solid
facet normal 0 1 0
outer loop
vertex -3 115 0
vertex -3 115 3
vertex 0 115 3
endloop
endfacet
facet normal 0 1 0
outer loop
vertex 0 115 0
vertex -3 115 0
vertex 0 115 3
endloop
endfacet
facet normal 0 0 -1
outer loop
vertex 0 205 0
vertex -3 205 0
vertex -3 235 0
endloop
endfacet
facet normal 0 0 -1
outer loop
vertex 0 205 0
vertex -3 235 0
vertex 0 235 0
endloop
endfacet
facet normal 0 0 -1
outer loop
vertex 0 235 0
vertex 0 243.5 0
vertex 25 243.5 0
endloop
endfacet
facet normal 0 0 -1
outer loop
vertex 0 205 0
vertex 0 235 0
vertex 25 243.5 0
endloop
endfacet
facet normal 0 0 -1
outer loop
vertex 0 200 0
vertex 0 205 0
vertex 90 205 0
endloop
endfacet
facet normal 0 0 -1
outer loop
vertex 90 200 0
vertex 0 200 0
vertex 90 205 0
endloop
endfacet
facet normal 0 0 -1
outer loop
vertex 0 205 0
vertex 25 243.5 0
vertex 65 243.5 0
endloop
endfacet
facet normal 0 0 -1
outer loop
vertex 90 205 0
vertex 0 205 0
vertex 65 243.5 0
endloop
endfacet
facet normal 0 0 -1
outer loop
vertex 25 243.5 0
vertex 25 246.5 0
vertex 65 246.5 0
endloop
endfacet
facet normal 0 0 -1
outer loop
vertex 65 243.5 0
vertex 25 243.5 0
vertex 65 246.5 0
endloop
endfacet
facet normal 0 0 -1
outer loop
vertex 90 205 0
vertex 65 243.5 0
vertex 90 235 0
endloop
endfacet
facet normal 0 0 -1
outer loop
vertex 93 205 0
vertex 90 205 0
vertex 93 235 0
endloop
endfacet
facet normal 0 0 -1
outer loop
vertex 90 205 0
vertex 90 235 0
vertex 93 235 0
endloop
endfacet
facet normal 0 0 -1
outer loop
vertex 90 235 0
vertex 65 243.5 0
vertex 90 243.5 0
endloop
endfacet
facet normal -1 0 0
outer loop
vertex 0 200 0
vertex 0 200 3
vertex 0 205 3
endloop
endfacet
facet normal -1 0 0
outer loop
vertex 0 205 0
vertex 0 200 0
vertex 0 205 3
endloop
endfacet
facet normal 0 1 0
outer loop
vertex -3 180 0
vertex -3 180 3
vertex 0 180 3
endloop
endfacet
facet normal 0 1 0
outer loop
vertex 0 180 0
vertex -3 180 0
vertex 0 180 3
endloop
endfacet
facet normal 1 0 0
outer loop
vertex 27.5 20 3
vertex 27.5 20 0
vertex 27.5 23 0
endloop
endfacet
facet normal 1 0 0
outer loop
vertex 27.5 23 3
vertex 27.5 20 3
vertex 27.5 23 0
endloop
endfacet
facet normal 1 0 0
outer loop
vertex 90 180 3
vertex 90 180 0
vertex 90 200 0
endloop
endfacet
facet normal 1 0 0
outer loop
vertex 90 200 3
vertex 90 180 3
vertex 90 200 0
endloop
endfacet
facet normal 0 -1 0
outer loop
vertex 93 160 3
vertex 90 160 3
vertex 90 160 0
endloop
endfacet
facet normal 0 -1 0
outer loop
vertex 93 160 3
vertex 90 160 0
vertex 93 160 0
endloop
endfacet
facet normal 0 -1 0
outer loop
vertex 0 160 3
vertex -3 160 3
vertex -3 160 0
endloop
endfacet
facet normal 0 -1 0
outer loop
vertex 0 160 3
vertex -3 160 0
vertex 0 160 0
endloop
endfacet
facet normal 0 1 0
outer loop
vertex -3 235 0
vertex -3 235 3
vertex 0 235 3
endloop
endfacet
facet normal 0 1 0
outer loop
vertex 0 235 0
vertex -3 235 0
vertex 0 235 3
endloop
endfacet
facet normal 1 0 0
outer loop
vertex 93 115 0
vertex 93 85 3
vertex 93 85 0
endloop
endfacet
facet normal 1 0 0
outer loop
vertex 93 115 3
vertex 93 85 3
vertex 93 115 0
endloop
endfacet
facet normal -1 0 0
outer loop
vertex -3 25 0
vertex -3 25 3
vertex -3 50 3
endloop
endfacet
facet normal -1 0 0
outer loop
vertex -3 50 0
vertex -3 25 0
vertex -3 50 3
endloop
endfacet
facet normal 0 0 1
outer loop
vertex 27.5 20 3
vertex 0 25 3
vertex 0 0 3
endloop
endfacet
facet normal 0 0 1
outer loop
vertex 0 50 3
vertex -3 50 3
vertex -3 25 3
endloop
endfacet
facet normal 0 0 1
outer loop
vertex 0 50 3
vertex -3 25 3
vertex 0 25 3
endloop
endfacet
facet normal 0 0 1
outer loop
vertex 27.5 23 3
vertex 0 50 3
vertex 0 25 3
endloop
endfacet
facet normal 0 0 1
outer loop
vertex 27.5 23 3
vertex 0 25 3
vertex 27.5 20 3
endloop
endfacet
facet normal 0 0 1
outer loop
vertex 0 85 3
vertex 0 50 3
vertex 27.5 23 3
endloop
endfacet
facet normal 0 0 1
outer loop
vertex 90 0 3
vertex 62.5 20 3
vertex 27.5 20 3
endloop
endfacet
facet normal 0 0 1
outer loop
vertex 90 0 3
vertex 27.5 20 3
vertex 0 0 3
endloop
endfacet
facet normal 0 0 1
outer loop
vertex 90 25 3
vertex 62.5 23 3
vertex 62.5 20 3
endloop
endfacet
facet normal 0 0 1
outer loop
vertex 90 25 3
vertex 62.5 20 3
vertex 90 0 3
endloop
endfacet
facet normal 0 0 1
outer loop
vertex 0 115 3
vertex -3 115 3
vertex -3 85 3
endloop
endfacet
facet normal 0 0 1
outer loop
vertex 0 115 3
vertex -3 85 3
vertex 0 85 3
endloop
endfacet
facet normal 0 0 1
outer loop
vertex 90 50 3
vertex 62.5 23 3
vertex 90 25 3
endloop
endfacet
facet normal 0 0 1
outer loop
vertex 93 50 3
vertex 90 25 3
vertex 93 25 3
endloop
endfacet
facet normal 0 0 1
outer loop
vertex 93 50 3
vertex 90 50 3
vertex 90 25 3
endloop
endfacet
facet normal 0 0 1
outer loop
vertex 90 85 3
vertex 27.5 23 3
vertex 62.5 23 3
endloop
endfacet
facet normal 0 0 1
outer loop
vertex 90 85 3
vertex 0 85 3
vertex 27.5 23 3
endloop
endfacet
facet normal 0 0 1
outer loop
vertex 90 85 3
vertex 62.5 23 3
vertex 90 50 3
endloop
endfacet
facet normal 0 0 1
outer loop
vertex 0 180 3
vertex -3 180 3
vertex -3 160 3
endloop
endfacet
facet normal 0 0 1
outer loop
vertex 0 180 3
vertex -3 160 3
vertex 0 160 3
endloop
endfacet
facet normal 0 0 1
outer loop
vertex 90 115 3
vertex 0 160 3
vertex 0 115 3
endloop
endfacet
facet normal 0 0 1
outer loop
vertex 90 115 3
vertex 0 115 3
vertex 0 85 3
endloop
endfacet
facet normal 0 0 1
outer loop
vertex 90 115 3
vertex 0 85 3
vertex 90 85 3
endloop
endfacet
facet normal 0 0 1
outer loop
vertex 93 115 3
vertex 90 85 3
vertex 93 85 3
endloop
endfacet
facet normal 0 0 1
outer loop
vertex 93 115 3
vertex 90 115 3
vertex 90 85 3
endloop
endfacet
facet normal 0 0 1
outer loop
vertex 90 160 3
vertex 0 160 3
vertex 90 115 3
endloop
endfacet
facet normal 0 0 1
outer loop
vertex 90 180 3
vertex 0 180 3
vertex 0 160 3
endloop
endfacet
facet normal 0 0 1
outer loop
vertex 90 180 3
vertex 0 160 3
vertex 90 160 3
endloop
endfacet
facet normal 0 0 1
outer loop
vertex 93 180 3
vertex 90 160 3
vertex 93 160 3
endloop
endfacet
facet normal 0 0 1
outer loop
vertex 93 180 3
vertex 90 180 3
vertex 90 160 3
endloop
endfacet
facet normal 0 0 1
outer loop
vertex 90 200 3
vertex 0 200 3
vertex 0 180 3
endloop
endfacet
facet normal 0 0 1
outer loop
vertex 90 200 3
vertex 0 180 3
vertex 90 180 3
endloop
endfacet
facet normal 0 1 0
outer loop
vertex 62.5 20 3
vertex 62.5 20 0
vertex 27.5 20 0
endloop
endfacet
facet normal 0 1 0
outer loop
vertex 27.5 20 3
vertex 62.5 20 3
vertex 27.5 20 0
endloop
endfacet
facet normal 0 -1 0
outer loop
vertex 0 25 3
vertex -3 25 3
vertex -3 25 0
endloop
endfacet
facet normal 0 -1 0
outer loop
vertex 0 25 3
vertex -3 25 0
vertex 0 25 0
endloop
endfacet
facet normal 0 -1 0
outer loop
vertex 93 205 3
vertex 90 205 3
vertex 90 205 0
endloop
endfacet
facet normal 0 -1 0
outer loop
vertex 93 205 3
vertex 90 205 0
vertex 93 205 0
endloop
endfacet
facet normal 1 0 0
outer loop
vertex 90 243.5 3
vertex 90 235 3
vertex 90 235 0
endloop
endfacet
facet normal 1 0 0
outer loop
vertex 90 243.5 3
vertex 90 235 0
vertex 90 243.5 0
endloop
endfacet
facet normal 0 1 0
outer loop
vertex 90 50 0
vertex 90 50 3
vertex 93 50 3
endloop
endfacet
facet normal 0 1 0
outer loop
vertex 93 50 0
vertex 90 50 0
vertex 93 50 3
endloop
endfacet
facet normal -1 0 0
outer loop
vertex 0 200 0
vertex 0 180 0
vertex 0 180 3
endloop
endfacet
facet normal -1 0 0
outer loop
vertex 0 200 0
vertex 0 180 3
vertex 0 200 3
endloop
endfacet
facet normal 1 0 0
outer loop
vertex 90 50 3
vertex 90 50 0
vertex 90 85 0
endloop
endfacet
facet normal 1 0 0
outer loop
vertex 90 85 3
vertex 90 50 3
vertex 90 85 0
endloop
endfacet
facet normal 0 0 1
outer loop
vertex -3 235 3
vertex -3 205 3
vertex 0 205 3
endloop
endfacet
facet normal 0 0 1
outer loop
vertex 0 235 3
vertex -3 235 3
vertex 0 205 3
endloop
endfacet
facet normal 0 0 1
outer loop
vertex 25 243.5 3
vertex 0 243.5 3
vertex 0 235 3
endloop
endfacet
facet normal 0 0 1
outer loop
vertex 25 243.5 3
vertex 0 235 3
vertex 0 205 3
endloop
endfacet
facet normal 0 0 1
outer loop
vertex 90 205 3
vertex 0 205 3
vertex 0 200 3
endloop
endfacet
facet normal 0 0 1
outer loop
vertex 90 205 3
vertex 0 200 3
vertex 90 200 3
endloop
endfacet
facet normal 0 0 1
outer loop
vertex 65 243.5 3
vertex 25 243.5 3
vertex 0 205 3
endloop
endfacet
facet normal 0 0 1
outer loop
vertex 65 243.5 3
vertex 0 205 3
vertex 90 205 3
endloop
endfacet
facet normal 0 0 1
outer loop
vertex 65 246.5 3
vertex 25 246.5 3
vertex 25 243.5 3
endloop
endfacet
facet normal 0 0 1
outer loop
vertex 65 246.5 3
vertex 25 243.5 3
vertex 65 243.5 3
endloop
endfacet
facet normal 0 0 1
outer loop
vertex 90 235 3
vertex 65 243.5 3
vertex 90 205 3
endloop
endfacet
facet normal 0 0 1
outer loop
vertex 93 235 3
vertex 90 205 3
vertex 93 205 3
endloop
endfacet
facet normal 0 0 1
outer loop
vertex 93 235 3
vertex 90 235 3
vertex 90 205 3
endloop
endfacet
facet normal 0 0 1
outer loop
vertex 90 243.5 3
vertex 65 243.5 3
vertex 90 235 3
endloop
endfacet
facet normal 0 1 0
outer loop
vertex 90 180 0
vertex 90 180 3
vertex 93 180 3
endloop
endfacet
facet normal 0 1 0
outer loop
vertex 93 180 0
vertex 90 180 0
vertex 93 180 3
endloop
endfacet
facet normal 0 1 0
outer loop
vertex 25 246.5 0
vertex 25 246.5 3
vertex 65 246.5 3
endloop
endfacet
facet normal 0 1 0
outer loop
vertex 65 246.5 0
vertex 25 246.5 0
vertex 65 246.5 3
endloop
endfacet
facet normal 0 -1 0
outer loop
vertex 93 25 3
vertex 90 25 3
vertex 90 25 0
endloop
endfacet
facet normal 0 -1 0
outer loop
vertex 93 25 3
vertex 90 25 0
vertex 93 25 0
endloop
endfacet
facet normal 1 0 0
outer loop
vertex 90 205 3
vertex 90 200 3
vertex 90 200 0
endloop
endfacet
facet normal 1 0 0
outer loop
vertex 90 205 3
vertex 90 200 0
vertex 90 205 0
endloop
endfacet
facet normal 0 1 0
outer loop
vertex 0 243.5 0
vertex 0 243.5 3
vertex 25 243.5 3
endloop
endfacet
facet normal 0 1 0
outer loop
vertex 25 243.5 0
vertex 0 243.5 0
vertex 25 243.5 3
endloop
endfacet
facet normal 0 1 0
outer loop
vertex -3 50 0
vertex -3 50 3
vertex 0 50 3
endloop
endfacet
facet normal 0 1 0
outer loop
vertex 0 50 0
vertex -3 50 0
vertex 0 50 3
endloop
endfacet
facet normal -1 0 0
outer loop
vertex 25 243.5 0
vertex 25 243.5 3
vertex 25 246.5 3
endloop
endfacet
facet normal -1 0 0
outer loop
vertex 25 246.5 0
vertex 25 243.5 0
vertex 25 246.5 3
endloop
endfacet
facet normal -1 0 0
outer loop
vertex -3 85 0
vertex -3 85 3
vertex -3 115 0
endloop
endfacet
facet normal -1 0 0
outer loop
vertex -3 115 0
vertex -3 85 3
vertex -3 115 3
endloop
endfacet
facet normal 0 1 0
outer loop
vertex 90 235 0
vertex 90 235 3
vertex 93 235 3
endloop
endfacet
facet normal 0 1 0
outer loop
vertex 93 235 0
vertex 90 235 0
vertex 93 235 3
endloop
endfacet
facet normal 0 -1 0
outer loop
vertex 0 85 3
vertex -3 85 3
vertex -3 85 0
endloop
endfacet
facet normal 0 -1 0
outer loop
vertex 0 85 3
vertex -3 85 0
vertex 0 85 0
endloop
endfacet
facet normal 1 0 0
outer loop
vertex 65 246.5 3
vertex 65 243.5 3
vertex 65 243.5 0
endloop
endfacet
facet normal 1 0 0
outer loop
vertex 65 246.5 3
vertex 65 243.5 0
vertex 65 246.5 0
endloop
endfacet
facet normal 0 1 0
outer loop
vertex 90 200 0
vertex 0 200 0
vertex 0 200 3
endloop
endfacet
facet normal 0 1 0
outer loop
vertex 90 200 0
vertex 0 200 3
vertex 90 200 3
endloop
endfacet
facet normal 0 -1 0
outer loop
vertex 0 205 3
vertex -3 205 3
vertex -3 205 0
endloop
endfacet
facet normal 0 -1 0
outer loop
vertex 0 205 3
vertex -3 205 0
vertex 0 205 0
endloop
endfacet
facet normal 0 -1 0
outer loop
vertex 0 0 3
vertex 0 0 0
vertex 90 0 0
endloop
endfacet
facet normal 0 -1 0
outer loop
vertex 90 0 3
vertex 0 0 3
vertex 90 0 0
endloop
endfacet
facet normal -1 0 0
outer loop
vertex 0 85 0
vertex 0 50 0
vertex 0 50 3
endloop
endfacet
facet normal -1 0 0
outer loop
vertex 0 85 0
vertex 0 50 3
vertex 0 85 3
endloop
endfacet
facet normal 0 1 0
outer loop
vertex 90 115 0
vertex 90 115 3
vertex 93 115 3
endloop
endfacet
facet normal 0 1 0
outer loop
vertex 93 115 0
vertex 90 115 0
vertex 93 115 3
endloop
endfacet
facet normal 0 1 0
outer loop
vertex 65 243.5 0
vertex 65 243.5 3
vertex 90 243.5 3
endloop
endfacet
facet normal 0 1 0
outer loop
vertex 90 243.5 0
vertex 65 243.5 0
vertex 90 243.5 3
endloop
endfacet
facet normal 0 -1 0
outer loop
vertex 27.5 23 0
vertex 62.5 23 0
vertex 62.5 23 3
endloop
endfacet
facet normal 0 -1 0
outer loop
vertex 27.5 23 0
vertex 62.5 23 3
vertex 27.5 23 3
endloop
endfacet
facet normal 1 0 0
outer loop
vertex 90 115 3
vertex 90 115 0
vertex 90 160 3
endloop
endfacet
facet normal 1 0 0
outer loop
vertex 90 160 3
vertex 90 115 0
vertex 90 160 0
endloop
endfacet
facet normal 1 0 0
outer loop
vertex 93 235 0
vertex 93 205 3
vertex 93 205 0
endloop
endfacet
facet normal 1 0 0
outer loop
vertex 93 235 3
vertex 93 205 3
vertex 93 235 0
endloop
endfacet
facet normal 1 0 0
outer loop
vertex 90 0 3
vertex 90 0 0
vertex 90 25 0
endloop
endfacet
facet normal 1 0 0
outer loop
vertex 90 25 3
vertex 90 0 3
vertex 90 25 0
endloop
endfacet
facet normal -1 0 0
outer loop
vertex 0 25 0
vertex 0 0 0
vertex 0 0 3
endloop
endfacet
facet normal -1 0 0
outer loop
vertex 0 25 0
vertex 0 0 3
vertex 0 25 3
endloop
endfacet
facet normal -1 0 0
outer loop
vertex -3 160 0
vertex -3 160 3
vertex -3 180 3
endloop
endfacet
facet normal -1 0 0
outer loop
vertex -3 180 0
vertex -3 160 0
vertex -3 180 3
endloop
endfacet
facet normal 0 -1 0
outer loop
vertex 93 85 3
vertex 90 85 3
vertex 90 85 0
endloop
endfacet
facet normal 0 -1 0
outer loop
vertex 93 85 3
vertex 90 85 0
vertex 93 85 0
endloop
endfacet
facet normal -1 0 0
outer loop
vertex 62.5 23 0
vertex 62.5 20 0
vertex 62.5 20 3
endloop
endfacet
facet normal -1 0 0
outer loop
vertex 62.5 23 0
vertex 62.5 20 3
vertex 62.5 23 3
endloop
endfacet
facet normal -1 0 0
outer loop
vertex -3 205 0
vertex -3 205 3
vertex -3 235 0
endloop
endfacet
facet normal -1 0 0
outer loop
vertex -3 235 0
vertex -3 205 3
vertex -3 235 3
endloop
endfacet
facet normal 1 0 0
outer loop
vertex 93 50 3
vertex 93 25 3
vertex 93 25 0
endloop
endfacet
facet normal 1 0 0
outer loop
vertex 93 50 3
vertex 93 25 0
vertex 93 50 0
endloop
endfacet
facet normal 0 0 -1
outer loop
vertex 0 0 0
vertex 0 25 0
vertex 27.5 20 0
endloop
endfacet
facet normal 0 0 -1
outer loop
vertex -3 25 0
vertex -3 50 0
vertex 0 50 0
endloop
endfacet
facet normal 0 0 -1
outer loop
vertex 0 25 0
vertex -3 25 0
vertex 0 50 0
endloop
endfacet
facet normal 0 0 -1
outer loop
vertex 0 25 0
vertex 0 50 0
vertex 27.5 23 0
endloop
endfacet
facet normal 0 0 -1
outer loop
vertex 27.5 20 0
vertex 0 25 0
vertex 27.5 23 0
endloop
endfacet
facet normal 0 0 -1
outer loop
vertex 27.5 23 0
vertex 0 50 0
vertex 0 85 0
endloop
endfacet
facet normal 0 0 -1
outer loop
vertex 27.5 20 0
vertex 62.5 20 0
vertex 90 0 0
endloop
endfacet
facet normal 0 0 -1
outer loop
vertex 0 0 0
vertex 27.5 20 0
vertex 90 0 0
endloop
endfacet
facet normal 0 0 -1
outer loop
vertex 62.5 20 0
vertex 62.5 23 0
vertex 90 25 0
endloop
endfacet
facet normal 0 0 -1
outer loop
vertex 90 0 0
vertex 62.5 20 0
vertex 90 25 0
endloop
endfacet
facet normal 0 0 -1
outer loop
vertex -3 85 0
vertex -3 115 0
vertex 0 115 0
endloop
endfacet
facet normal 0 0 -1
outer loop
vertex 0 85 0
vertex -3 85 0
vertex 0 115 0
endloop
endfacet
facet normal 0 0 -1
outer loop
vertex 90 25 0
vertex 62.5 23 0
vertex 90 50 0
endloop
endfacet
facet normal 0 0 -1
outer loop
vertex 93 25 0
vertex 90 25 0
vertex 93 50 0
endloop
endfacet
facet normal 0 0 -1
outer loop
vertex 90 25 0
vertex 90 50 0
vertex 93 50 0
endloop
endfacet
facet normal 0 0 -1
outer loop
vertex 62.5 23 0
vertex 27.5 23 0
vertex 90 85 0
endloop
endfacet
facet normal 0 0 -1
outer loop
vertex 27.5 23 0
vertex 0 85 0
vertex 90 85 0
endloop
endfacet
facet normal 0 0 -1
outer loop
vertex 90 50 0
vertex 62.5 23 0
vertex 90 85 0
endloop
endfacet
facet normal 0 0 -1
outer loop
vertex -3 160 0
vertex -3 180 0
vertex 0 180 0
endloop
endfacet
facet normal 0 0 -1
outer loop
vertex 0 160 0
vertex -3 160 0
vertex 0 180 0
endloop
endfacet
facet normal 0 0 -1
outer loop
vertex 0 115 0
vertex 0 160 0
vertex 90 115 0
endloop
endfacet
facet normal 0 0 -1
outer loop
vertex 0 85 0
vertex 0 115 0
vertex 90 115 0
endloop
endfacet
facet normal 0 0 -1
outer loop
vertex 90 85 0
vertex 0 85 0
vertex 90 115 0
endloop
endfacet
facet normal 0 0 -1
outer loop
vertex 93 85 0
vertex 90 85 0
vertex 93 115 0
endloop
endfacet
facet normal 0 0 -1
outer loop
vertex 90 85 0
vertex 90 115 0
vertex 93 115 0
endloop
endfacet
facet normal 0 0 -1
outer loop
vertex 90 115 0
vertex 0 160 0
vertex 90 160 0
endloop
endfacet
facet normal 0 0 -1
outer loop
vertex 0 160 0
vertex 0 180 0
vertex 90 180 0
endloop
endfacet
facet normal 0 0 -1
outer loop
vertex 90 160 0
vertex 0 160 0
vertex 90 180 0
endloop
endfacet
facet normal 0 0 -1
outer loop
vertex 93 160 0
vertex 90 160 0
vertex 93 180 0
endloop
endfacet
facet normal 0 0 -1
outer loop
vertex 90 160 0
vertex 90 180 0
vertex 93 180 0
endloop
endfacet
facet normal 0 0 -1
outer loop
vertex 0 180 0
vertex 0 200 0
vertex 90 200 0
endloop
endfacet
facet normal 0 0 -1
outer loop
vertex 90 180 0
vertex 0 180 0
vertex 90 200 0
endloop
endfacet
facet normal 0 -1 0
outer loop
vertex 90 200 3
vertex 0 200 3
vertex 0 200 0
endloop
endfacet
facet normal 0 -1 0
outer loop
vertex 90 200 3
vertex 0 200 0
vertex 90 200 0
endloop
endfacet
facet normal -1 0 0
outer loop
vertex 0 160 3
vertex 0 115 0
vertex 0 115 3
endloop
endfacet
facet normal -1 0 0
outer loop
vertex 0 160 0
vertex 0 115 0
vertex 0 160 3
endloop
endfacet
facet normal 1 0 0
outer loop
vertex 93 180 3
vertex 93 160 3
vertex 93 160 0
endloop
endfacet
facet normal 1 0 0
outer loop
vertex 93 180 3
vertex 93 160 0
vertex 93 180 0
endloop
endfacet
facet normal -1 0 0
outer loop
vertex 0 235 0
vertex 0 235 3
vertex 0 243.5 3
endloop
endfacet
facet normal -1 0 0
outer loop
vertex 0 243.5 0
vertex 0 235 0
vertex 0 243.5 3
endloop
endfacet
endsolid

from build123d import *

# Parameters (mm, degrees)
SKETCH1_W           = 90
SKETCH1_H           = 200
BOSS_EXTRUDE1_DEPTH = 3
SKETCH3_W           = 3
SKETCH3_H           = 20
SKETCH3_H_2         = 30
SKETCH3_H_3         = 25
BOSS_EXTRUDE2_DEPTH = 3
SKETCH4_W           = 90
SKETCH4_H           = 43.5
SKETCH4_W_2         = 40
SKETCH4_H_2         = 3
BOSS_EXTRUDE4_DEPTH = 3
SKETCH7_W           = 35
SKETCH7_H           = 3
CUT_EXTRUDE3_DEPTH  = 4
SKETCH12_W          = 3
SKETCH12_H          = 30
BOSS_EXTRUDE7_DEPTH = 3


with BuildPart() as part:
    # Sketch1 → Boss-Extrude1 (new body)
    with BuildSketch(Plane.XY):
        with Locations((45, 100)):
            Rectangle(SKETCH1_W, SKETCH1_H)
    extrude(amount=BOSS_EXTRUDE1_DEPTH)

    # Sketch3 → Boss-Extrude2 (add)
    with BuildSketch(Plane.XY.offset(3)):
        with Locations((-1.5, 170)):
            Rectangle(SKETCH3_W, SKETCH3_H)
        with Locations((91.5, 170)):
            Rectangle(SKETCH3_W, SKETCH3_H)
        with Locations((91.5, 100)):
            Rectangle(SKETCH3_W, SKETCH3_H_2)
        with Locations((-1.5, 100)):
            Rectangle(SKETCH3_W, SKETCH3_H_2)
        with Locations((-1.5, 37.5)):
            Rectangle(SKETCH3_W, SKETCH3_H_3)
        with Locations((91.5, 37.5)):
            Rectangle(SKETCH3_W, SKETCH3_H_3)
    extrude(amount=-BOSS_EXTRUDE2_DEPTH)

    # Sketch7 → Cut-Extrude3 (cut)
    with BuildSketch(Plane(origin=(0, 0, 0), x_dir=(-1, 0, 0), z_dir=(0, 0, -1))):
        with Locations((-45, 21.5)):
            Rectangle(SKETCH7_W, SKETCH7_H)
    extrude(amount=-CUT_EXTRUDE3_DEPTH, mode=Mode.SUBTRACT)


with BuildPart() as body_2:
    # Sketch4 → Boss-Extrude4 (new body)
    with BuildSketch(Plane.XY.offset(3)):
        with Locations((45, 221.75)):
            Rectangle(SKETCH4_W, SKETCH4_H)
        with Locations((45, 245)):
            Rectangle(SKETCH4_W_2, SKETCH4_H_2)
    extrude(amount=-BOSS_EXTRUDE4_DEPTH)

    # Sketch12 → Boss-Extrude7 (add)
    with BuildSketch(Plane.XY.offset(3)):
        with Locations((-1.5, 220)):
            Rectangle(SKETCH12_W, SKETCH12_H)
        with Locations((91.5, 220)):
            Rectangle(SKETCH12_W, SKETCH12_H)
    extrude(amount=-BOSS_EXTRUDE7_DEPTH)


solid = Compound([part.part, body_2.part])
